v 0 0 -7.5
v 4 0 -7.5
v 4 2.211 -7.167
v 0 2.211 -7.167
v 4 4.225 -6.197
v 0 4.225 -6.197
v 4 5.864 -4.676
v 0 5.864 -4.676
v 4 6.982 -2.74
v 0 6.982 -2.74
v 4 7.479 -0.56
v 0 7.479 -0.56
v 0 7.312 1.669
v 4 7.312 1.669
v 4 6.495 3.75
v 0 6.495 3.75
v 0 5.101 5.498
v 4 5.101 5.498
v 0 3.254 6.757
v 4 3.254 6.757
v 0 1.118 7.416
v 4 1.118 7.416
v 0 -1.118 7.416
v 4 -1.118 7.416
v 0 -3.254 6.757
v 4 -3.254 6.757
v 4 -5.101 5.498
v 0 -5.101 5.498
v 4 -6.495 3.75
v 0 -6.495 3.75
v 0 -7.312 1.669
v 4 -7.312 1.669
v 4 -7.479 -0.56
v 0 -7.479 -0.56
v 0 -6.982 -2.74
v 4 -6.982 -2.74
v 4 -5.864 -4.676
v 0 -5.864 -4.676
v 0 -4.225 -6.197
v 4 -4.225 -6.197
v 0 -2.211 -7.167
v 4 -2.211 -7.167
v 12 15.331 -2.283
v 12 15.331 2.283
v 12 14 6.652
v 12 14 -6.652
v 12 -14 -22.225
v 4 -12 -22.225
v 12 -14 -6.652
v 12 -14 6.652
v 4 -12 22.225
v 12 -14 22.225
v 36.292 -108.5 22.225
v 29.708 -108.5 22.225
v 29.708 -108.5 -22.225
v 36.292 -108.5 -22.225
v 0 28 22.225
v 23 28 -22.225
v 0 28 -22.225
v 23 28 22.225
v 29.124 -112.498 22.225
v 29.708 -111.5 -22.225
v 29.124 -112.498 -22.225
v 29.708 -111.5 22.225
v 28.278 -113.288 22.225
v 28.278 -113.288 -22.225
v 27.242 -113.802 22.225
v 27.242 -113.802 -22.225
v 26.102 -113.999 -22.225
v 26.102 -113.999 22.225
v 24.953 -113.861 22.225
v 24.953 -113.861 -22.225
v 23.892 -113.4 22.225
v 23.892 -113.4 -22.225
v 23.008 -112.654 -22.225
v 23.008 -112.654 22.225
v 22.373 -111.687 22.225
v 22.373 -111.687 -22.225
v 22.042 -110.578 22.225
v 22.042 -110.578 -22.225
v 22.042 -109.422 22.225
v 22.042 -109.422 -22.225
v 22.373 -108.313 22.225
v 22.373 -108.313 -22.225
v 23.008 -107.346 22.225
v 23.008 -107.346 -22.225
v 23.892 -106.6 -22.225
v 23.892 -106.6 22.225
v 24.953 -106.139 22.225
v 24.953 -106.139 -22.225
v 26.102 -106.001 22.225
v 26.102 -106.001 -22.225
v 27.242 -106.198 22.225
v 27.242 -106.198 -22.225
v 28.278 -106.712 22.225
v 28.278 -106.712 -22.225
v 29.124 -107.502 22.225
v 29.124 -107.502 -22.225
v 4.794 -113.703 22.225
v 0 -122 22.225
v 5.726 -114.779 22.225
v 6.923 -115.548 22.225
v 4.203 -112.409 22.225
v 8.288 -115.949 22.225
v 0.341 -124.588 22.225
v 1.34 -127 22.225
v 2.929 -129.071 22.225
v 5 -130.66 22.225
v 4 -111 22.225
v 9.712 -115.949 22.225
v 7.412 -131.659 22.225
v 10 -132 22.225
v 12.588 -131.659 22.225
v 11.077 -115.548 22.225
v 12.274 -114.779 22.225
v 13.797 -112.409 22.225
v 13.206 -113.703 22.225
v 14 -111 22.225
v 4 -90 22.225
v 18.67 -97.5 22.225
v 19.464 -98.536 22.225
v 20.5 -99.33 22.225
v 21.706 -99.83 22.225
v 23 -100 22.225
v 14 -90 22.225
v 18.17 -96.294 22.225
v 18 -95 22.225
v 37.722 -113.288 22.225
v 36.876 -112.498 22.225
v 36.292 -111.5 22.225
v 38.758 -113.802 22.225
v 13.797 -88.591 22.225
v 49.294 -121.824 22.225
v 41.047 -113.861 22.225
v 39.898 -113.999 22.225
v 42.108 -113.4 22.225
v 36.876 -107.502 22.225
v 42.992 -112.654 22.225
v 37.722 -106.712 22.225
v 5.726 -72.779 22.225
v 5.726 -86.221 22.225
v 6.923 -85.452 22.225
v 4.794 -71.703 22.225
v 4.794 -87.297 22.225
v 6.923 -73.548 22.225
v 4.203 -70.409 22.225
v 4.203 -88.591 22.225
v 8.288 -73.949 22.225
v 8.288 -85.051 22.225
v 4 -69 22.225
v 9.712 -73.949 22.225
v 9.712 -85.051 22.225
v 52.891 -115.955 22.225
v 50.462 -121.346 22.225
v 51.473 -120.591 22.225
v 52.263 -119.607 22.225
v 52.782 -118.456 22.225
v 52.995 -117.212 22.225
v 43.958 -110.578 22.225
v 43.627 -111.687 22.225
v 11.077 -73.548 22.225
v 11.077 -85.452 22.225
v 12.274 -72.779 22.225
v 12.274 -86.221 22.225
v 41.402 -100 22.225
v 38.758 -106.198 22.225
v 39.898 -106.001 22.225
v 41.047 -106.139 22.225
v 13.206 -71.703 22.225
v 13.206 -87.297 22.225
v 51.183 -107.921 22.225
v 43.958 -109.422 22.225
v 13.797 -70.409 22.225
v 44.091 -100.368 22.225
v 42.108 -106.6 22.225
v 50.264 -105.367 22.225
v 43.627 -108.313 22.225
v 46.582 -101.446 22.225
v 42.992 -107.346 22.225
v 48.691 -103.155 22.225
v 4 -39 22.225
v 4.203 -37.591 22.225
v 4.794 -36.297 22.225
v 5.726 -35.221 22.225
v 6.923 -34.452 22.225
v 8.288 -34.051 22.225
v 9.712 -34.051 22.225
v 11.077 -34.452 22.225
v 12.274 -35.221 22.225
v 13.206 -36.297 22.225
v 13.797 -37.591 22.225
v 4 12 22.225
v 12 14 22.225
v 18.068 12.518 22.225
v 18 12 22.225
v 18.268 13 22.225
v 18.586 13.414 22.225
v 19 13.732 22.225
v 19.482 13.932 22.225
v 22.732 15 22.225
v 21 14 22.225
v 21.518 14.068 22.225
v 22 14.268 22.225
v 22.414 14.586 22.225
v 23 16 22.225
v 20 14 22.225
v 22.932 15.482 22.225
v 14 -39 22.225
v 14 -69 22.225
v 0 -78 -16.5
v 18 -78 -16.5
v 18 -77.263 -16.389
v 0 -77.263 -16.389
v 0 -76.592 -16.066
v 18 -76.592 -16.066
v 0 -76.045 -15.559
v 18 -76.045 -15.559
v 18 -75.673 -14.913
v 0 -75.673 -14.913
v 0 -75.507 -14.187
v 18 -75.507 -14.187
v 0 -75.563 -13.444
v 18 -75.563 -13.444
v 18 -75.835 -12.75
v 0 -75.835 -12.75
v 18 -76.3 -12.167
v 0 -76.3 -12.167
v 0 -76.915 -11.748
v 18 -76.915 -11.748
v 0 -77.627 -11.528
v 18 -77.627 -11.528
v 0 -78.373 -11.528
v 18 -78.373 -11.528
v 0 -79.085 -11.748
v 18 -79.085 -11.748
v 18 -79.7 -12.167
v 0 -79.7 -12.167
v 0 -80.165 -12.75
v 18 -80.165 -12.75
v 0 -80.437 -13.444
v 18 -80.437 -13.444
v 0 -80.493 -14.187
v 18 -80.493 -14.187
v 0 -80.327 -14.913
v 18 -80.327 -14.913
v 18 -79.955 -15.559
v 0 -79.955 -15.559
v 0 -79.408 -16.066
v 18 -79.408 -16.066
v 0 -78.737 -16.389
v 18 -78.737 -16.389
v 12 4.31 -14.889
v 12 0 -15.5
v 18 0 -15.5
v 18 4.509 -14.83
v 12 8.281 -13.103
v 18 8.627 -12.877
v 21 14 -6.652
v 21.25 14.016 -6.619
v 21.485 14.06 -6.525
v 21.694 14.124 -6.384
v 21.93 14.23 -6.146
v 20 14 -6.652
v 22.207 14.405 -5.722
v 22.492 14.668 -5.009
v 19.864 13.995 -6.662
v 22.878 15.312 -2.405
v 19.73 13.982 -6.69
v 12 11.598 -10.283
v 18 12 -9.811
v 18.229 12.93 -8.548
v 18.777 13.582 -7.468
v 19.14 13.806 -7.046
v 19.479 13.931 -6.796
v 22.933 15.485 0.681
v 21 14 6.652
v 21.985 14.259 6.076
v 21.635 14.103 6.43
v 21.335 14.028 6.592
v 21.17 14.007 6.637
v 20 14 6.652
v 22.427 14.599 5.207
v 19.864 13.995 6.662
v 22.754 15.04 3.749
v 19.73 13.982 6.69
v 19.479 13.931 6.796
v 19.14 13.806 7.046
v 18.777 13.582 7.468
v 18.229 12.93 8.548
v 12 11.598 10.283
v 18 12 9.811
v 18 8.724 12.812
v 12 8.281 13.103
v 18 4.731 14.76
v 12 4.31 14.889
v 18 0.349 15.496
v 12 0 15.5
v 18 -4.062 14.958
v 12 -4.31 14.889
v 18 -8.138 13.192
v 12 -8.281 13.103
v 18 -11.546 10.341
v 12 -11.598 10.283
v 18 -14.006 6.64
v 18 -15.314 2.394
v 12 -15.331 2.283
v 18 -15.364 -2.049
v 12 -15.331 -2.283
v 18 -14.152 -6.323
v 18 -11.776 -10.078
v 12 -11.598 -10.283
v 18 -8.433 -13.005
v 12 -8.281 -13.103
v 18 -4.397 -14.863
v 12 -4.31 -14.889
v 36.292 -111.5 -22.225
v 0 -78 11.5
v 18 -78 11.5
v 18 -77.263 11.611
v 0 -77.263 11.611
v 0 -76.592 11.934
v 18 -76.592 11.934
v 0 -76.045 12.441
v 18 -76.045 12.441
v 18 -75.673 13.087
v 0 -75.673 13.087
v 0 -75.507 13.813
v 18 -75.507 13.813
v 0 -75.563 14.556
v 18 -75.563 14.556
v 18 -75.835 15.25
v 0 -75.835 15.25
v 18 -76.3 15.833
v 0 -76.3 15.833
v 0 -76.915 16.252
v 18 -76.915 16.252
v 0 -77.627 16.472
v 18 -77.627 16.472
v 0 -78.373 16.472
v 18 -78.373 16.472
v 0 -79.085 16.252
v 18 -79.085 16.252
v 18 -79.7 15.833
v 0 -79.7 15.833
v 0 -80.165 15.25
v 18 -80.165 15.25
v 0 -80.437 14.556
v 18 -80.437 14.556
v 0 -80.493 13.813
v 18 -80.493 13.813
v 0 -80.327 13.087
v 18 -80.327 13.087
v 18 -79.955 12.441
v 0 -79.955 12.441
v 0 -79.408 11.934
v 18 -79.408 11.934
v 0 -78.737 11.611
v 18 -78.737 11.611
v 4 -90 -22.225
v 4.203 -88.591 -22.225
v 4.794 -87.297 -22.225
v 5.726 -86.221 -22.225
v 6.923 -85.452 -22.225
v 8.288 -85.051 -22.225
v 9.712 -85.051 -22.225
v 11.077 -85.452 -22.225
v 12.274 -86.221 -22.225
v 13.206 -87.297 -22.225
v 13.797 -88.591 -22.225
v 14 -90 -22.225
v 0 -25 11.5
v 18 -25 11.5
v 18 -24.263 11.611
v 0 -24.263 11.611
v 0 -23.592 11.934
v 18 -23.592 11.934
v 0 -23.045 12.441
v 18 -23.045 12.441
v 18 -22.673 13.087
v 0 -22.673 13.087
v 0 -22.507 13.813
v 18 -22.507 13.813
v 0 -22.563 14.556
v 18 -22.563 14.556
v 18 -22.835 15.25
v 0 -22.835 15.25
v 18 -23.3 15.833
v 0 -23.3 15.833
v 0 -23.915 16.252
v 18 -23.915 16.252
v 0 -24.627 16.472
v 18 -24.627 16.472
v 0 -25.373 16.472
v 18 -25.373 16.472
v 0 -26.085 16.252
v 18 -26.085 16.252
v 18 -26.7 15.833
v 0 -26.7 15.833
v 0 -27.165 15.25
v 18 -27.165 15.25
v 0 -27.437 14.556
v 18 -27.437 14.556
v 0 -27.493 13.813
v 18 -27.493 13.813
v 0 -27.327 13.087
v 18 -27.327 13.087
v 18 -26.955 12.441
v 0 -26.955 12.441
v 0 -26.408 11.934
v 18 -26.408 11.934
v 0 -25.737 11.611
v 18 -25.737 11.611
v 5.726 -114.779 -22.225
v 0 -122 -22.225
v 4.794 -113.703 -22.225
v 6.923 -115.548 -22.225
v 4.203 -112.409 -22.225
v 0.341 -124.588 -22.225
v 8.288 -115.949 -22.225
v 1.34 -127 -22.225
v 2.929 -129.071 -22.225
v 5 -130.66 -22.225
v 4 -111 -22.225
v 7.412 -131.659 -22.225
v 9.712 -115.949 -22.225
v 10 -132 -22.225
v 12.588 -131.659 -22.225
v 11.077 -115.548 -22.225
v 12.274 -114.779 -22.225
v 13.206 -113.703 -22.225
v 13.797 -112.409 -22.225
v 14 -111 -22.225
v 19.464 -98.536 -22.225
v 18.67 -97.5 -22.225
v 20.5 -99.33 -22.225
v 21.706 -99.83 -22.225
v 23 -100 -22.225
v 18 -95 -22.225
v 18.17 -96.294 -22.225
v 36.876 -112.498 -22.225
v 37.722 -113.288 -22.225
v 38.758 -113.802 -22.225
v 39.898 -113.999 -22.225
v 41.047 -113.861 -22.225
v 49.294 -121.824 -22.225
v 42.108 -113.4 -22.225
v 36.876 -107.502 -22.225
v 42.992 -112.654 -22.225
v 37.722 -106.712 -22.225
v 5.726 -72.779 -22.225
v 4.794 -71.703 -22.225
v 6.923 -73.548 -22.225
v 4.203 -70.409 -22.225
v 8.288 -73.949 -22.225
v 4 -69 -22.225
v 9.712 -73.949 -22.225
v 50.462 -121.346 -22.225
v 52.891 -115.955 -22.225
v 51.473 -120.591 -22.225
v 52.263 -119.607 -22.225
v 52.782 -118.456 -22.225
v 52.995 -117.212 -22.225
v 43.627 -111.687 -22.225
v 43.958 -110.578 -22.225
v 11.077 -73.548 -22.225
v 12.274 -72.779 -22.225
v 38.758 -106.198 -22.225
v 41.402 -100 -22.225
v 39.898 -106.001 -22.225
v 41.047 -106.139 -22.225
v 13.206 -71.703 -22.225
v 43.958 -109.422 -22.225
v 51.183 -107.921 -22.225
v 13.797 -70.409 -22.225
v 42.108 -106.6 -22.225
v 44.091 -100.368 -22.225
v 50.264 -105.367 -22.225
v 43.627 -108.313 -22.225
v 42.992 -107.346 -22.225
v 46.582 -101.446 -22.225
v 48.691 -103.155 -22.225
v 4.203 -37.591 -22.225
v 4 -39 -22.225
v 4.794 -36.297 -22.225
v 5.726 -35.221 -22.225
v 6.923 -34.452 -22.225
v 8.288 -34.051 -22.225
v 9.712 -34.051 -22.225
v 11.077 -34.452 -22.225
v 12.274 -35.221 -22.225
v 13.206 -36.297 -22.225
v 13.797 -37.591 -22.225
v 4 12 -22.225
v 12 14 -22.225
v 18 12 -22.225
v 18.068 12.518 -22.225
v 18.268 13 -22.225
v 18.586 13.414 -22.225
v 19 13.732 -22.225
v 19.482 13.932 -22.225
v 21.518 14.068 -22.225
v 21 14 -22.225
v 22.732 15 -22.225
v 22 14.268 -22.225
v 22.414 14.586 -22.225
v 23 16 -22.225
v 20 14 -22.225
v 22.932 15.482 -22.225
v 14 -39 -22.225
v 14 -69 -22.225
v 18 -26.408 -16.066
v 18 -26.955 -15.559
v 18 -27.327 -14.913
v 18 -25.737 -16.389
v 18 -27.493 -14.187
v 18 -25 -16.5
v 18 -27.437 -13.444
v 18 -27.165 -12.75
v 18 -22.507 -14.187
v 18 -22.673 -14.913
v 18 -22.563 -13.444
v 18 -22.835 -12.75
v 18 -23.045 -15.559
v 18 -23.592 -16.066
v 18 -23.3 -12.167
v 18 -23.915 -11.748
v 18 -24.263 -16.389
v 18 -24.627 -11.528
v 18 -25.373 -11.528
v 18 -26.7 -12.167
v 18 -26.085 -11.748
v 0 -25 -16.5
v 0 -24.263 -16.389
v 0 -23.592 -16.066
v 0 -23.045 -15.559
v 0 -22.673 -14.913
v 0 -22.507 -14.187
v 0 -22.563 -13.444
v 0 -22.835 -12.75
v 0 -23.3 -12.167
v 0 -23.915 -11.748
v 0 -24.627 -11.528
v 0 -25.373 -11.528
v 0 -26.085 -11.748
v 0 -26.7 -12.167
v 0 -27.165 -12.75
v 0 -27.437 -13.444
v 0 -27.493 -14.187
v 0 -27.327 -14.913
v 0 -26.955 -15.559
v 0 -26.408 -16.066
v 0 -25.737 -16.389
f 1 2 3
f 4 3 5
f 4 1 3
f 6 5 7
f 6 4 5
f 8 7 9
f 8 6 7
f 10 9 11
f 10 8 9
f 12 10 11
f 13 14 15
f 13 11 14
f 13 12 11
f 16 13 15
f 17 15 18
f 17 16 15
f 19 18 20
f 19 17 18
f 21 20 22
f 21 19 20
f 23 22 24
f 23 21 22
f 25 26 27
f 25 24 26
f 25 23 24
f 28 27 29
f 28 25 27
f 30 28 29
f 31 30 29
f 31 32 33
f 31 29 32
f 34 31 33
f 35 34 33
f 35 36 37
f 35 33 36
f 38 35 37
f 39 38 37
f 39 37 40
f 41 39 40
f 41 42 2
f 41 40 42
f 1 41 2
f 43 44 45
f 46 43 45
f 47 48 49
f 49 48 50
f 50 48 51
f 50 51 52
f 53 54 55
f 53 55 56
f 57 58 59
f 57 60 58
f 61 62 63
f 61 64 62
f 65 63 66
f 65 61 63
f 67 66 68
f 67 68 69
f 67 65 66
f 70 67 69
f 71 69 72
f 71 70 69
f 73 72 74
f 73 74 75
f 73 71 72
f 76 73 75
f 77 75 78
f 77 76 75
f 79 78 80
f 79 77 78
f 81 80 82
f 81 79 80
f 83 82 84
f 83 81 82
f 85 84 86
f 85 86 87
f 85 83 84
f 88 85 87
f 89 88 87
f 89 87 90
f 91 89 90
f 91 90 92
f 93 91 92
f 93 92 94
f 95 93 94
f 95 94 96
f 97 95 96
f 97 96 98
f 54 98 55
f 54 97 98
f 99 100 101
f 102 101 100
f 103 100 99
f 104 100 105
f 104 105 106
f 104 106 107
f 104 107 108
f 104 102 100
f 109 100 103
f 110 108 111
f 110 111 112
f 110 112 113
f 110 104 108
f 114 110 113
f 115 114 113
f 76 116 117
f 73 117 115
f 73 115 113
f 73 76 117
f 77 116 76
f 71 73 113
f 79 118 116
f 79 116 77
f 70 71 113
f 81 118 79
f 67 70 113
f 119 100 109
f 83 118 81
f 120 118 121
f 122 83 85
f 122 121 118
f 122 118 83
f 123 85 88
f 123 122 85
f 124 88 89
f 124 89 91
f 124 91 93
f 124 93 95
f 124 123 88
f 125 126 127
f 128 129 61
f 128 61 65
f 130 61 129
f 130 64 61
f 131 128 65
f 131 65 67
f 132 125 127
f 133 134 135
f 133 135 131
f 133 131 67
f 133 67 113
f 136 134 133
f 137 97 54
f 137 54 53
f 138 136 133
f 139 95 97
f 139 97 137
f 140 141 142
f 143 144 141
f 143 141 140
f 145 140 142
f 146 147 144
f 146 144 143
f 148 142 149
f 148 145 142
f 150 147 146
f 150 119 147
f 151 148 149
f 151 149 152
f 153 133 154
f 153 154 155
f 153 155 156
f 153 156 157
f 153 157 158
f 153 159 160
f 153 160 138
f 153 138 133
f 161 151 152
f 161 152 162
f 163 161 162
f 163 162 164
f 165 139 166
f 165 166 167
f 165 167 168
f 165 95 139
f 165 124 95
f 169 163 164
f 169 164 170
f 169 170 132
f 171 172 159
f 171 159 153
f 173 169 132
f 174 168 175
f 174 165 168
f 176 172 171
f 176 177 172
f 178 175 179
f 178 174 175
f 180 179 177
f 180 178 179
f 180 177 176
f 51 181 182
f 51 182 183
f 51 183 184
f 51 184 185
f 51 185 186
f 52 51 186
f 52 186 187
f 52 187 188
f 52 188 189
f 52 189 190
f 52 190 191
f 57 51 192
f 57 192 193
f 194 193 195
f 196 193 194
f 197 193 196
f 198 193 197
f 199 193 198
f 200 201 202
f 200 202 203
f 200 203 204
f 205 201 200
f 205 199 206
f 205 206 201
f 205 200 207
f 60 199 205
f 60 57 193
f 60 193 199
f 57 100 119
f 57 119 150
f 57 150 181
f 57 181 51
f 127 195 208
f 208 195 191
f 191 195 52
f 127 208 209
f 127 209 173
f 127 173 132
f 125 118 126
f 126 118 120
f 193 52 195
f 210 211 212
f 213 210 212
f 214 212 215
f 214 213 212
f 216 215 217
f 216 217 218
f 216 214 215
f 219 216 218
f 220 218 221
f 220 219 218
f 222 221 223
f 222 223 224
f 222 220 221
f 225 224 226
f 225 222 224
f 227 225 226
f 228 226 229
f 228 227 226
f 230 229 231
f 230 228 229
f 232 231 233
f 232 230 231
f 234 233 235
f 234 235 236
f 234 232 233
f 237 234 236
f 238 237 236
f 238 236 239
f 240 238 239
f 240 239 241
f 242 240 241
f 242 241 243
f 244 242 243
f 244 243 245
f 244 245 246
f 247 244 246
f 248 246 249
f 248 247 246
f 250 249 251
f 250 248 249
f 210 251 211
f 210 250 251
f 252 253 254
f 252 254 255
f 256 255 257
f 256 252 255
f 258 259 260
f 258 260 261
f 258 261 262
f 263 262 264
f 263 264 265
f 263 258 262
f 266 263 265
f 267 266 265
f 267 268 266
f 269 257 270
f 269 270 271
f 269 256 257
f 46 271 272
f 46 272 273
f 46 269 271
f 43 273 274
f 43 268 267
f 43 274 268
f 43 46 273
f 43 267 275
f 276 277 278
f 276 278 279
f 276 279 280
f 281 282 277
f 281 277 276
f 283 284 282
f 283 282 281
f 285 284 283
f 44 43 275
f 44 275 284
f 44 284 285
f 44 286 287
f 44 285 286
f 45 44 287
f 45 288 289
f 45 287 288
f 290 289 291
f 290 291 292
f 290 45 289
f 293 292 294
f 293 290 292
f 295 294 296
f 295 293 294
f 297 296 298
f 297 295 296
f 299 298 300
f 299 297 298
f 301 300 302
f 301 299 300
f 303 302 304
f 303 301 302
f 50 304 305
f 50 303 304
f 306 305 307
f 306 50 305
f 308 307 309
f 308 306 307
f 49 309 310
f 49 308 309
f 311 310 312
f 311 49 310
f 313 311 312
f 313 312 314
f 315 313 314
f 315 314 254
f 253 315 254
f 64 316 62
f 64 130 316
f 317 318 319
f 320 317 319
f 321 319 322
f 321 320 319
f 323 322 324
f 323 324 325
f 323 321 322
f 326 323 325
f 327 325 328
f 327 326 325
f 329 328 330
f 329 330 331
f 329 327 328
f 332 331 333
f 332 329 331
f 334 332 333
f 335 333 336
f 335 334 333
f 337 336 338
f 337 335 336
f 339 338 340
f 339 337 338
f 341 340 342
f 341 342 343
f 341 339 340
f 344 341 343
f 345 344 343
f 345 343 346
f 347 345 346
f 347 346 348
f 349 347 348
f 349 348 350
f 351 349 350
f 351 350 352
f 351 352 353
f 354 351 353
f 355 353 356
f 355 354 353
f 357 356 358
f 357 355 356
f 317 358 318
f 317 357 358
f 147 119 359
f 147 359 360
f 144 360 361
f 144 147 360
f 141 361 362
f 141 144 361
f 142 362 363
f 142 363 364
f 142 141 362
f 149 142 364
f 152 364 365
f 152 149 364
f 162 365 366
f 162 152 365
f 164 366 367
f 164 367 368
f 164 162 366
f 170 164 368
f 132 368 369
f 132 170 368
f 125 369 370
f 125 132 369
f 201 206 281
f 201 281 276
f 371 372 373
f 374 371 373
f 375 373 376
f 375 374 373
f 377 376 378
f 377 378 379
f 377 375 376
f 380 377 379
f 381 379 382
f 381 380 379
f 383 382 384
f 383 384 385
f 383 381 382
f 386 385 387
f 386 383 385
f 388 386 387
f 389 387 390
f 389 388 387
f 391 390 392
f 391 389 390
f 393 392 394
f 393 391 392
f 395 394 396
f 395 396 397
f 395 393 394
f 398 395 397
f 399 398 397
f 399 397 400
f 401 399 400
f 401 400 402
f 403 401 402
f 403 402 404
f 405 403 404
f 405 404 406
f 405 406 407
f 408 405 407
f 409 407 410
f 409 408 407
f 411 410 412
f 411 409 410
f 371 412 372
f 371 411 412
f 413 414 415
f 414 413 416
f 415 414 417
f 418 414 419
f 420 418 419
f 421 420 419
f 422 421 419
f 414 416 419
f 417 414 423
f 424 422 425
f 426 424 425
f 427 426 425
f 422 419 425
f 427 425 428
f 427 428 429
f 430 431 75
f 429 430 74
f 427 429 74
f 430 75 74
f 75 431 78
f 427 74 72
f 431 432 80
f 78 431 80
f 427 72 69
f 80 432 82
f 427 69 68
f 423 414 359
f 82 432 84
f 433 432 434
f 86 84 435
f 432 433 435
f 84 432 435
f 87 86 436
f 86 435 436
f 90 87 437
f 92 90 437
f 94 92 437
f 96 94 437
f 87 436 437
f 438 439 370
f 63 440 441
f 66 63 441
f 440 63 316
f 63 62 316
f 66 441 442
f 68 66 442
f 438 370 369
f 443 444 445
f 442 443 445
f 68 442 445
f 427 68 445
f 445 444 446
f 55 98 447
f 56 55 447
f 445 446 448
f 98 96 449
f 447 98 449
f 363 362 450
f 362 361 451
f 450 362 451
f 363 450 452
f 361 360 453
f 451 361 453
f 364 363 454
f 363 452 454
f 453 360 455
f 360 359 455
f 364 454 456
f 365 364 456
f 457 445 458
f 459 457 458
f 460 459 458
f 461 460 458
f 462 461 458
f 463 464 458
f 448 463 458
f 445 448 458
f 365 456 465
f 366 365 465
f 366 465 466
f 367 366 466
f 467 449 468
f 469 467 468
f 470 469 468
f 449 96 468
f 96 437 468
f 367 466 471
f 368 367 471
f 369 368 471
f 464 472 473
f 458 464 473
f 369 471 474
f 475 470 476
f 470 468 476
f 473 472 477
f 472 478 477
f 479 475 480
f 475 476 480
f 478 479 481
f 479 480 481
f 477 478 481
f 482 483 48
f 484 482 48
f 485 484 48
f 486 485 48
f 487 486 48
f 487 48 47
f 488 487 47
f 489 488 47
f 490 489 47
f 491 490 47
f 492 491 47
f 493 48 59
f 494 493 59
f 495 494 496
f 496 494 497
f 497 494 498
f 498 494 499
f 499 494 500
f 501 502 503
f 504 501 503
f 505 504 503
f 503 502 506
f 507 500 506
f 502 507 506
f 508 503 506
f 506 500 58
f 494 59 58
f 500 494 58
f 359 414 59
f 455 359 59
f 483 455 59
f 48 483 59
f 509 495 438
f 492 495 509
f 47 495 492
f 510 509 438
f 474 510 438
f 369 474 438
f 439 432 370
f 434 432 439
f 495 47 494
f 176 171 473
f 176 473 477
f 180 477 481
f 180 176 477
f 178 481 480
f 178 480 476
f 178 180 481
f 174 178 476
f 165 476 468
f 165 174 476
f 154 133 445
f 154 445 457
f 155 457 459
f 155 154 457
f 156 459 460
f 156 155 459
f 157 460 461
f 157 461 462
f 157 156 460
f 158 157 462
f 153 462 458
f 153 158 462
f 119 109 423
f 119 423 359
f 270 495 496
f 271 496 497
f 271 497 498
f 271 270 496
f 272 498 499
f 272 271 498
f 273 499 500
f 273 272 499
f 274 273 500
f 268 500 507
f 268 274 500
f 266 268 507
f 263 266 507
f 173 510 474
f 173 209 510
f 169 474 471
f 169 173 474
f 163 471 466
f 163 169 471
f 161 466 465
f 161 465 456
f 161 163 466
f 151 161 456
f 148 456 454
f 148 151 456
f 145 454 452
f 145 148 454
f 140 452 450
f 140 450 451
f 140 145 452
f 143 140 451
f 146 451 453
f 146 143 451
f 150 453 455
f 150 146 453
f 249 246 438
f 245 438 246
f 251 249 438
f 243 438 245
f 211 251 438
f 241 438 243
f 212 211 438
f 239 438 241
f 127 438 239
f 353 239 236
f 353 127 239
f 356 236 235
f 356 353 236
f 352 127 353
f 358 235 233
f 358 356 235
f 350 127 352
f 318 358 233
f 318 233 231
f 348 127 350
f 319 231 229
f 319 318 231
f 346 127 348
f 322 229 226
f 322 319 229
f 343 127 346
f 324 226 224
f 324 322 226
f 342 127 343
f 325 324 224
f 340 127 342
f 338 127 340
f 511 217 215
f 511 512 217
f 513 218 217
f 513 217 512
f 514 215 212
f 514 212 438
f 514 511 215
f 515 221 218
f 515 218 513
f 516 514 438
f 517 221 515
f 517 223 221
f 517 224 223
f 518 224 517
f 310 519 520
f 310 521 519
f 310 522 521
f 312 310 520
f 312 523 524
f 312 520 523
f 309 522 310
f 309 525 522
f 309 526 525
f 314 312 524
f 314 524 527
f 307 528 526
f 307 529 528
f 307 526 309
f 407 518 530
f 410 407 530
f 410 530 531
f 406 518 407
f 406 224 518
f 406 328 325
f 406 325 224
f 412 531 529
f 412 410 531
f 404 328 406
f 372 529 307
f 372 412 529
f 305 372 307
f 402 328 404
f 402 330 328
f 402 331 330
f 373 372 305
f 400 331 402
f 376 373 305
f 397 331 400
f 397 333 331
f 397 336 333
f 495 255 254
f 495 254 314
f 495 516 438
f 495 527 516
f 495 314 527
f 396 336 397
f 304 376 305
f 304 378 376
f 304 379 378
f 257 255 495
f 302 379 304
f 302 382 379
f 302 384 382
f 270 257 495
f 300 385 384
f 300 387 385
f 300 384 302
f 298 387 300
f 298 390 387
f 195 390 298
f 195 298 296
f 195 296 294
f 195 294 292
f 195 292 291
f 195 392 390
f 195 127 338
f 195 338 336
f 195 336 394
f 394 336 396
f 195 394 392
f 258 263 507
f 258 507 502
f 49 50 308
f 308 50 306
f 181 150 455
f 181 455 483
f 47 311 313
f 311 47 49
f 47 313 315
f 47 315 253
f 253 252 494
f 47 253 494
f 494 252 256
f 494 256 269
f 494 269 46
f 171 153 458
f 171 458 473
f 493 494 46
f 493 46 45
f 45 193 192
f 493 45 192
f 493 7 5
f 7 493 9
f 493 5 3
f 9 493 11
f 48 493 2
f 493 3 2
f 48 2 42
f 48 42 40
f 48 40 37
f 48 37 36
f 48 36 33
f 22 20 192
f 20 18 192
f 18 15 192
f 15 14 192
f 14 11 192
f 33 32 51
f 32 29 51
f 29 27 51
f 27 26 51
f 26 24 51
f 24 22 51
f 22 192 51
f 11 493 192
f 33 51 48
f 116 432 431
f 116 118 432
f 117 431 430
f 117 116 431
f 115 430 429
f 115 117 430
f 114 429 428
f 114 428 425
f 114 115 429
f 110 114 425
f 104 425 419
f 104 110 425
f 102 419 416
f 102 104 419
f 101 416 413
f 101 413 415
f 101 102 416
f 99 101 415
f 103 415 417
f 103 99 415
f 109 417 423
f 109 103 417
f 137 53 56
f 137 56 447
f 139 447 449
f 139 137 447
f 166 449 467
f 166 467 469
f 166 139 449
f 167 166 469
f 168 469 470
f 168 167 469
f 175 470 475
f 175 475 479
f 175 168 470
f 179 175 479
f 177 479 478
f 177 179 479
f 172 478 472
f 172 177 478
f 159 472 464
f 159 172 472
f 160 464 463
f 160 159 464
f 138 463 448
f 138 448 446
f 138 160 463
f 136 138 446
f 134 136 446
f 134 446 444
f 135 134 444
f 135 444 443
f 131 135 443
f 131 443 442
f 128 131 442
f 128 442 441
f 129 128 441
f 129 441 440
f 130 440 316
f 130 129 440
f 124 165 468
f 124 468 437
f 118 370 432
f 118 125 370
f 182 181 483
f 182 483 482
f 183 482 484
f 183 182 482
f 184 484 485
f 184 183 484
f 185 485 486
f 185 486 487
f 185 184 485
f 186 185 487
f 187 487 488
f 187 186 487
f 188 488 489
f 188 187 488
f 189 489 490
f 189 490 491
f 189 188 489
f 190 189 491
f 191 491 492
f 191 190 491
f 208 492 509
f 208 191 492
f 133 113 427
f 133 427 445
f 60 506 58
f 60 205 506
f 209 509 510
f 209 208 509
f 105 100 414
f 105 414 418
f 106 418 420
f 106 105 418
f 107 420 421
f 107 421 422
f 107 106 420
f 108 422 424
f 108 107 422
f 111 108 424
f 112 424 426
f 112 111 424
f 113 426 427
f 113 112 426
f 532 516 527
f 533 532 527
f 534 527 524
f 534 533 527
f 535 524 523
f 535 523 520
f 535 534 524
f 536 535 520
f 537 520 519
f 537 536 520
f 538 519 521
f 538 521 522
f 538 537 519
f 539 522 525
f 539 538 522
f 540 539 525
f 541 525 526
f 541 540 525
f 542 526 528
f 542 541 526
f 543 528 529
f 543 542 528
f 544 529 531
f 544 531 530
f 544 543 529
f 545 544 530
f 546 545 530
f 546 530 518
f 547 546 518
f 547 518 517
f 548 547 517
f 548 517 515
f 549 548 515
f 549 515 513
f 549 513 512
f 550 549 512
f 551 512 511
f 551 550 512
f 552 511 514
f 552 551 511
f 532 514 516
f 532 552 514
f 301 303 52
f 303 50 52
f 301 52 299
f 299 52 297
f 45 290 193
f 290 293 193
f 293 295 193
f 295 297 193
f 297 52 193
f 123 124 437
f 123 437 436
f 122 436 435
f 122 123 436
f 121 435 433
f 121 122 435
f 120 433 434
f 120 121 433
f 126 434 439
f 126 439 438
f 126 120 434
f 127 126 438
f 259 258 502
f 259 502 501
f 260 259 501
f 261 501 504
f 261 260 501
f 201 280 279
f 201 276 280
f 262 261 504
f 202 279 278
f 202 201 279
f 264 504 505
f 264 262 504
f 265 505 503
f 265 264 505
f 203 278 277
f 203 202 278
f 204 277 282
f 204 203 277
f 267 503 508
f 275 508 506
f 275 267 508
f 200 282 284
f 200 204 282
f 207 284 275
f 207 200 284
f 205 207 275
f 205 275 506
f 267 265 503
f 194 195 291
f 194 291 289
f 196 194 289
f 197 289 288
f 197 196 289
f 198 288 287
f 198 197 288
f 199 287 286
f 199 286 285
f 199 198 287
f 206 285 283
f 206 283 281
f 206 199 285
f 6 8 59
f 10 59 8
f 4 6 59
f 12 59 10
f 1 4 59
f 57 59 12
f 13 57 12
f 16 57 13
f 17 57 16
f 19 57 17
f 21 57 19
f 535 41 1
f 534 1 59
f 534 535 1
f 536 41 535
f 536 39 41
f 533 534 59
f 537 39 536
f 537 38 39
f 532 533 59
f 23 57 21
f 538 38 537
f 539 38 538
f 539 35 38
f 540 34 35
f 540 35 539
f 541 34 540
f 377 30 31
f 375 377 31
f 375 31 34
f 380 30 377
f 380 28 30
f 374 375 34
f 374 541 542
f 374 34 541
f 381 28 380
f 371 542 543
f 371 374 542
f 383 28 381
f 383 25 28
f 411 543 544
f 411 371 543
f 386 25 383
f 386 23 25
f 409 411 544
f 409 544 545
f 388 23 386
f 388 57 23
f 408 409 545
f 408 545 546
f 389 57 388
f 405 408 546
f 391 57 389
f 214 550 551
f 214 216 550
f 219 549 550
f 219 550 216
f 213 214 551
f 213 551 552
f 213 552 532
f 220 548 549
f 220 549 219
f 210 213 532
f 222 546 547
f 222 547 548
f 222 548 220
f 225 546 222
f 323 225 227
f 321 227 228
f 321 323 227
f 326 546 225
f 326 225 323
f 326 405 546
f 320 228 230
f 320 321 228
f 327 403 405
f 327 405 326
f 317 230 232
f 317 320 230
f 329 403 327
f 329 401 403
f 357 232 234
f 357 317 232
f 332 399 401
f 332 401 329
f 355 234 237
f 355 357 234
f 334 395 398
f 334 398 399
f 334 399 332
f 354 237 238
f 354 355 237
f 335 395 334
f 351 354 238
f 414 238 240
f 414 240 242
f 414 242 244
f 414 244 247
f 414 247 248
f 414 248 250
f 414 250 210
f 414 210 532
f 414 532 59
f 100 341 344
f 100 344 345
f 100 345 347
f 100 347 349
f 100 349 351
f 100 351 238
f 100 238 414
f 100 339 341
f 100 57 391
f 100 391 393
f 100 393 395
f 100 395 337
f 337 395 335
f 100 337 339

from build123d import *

# Parameters (mm, degrees)
BOSS_EXTRUDE1_DEPTH = 22.225
SKETCH2_R           = 2.5
SKETCH2_R_2         = 7.5
CUT_EXTRUDE5_DEPTH  = 18
CUT_EXTRUDE7_START  = 12
SKETCH2_8_R         = 15.5
CUT_EXTRUDE7_DEPTH  = 42


with BuildPart() as part:
    # Sketch1 → Boss-Extrude1 (new body, symmetric)
    with BuildSketch(Plane.XY):
        with BuildLine():
            Line((0, 28), (0, -122))
            ThreePointArc((0, -122), (3.91238571, -129.933533403), (12.588190451, -131.659258263))
            Line((12.588190451, -131.659258263), (49.294095226, -121.823940721))
            ThreePointArc((49.294095226, -121.823940721), (52.263200822, -119.606804413), (52.890738004, -115.954753136))
            Line((52.890738004, -115.954753136), (51.18308621, -107.920883092))
            ThreePointArc((51.18308621, -107.920883092), (47.694814113, -102.228540385), (41.401610203, -100))
            Line((41.401610203, -100), (23, -100))
            ThreePointArc((23, -100), (19.464466094, -98.535533906), (18, -95))
            Line((18, -95), (18, 12))
            ThreePointArc((18, 12), (18.585786438, 13.414213562), (20, 14))
            Line((20, 14), (21, 14))
            ThreePointArc((21, 14), (22.414213562, 14.585786438), (23, 16))
            Line((23, 16), (23, 28))
            Line((23, 28), (18, 28))
            Line((18, 28), (0, 28))
        make_face()
        with BuildLine():
            Line((4, -111), (4, -90))
            ThreePointArc((4, -90), (9, -85), (14, -90))
            Line((14, -90), (14, -111))
            ThreePointArc((14, -111), (9, -116), (4, -111))
        make_face(mode=Mode.SUBTRACT)
        with BuildLine():
            Line((4, -69), (4, -39))
            ThreePointArc((4, -39), (9, -34), (14, -39))
            Line((14, -39), (14, -69))
            ThreePointArc((14, -69), (9, -74), (4, -69))
        make_face(mode=Mode.SUBTRACT)
        with BuildLine():
            Line((29.708099244, -108.5), (36.291900756, -108.5))
            ThreePointArc((36.291900756, -108.5), (44, -110), (36.291900756, -111.5))
            Line((36.291900756, -111.5), (29.708099244, -111.5))
            ThreePointArc((29.708099244, -111.5), (22, -110), (29.708099244, -108.5))
        make_face(mode=Mode.SUBTRACT)
        Polygon((4, 12), (4, -12), (12, -14), (12, 14), align=None, mode=Mode.SUBTRACT)
    extrude(amount=BOSS_EXTRUDE1_DEPTH, both=True)

    # Sketch2 → Cut-Extrude5 (cut)
    with BuildSketch(Plane(origin=(0, 0, 0), x_dir=(0, 0, -1), z_dir=(1, 0, 0))):
        with Locations((14, -78)):
            Circle(SKETCH2_R)
        with Locations((-14, -78)):
            Circle(SKETCH2_R)
        with Locations((-14, -25)):
            Circle(SKETCH2_R)
        with Locations((14, -25)):
            Circle(SKETCH2_R)
        Circle(SKETCH2_R_2)
    extrude(amount=CUT_EXTRUDE5_DEPTH, mode=Mode.SUBTRACT)

    # Sketch2<8> → Cut-Extrude7 (cut, through all)
    with BuildSketch(Plane(origin=(0, 0, 0), x_dir=(0, 0, -1), z_dir=(1, 0, 0)).offset(CUT_EXTRUDE7_START)):
        Circle(SKETCH2_8_R)
    extrude(amount=CUT_EXTRUDE7_DEPTH, mode=Mode.SUBTRACT)


solid = part.part
